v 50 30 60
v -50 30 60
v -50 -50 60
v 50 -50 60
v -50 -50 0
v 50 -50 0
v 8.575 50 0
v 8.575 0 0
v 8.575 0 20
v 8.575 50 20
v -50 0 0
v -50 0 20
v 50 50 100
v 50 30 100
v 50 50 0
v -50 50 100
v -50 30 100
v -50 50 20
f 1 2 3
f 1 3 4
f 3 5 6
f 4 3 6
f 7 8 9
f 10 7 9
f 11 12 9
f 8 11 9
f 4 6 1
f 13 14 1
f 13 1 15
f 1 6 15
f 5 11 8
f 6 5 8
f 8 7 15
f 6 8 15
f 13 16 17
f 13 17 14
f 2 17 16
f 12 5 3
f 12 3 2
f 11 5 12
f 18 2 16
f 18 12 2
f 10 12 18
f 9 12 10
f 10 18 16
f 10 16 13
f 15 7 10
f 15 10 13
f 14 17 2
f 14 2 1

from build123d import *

# Parameters (mm, degrees)
F0_W     = 100
F0_H     = 100
F1_DEPTH = 100
F2_W     = 100
F2_H     = 80
F3_DEPTH = 40
F4_W     = 60
F4_H     = 40
F5_DEPTH = 50.001


with BuildPart() as f1:
    # F0 (on Top) → F1 (new body)
    with BuildSketch(Plane.XY):
        Rectangle(F0_W, F0_H)
    extrude(amount=F1_DEPTH)

    # F2 (on face) → F3 (cut)
    with BuildSketch(Plane.XY.offset(100)):
        with Locations((0, -10)):
            Rectangle(F2_W, F2_H)
    extrude(amount=-F3_DEPTH, mode=Mode.SUBTRACT)

    # F4 (on Front) → F5 (cut, through all)
    with BuildSketch(Plane.XZ):
        with Locations((-21.424717, 0)):
            Rectangle(F4_W, F4_H)
    extrude(amount=-F5_DEPTH, mode=Mode.SUBTRACT)


solid = f1.part
